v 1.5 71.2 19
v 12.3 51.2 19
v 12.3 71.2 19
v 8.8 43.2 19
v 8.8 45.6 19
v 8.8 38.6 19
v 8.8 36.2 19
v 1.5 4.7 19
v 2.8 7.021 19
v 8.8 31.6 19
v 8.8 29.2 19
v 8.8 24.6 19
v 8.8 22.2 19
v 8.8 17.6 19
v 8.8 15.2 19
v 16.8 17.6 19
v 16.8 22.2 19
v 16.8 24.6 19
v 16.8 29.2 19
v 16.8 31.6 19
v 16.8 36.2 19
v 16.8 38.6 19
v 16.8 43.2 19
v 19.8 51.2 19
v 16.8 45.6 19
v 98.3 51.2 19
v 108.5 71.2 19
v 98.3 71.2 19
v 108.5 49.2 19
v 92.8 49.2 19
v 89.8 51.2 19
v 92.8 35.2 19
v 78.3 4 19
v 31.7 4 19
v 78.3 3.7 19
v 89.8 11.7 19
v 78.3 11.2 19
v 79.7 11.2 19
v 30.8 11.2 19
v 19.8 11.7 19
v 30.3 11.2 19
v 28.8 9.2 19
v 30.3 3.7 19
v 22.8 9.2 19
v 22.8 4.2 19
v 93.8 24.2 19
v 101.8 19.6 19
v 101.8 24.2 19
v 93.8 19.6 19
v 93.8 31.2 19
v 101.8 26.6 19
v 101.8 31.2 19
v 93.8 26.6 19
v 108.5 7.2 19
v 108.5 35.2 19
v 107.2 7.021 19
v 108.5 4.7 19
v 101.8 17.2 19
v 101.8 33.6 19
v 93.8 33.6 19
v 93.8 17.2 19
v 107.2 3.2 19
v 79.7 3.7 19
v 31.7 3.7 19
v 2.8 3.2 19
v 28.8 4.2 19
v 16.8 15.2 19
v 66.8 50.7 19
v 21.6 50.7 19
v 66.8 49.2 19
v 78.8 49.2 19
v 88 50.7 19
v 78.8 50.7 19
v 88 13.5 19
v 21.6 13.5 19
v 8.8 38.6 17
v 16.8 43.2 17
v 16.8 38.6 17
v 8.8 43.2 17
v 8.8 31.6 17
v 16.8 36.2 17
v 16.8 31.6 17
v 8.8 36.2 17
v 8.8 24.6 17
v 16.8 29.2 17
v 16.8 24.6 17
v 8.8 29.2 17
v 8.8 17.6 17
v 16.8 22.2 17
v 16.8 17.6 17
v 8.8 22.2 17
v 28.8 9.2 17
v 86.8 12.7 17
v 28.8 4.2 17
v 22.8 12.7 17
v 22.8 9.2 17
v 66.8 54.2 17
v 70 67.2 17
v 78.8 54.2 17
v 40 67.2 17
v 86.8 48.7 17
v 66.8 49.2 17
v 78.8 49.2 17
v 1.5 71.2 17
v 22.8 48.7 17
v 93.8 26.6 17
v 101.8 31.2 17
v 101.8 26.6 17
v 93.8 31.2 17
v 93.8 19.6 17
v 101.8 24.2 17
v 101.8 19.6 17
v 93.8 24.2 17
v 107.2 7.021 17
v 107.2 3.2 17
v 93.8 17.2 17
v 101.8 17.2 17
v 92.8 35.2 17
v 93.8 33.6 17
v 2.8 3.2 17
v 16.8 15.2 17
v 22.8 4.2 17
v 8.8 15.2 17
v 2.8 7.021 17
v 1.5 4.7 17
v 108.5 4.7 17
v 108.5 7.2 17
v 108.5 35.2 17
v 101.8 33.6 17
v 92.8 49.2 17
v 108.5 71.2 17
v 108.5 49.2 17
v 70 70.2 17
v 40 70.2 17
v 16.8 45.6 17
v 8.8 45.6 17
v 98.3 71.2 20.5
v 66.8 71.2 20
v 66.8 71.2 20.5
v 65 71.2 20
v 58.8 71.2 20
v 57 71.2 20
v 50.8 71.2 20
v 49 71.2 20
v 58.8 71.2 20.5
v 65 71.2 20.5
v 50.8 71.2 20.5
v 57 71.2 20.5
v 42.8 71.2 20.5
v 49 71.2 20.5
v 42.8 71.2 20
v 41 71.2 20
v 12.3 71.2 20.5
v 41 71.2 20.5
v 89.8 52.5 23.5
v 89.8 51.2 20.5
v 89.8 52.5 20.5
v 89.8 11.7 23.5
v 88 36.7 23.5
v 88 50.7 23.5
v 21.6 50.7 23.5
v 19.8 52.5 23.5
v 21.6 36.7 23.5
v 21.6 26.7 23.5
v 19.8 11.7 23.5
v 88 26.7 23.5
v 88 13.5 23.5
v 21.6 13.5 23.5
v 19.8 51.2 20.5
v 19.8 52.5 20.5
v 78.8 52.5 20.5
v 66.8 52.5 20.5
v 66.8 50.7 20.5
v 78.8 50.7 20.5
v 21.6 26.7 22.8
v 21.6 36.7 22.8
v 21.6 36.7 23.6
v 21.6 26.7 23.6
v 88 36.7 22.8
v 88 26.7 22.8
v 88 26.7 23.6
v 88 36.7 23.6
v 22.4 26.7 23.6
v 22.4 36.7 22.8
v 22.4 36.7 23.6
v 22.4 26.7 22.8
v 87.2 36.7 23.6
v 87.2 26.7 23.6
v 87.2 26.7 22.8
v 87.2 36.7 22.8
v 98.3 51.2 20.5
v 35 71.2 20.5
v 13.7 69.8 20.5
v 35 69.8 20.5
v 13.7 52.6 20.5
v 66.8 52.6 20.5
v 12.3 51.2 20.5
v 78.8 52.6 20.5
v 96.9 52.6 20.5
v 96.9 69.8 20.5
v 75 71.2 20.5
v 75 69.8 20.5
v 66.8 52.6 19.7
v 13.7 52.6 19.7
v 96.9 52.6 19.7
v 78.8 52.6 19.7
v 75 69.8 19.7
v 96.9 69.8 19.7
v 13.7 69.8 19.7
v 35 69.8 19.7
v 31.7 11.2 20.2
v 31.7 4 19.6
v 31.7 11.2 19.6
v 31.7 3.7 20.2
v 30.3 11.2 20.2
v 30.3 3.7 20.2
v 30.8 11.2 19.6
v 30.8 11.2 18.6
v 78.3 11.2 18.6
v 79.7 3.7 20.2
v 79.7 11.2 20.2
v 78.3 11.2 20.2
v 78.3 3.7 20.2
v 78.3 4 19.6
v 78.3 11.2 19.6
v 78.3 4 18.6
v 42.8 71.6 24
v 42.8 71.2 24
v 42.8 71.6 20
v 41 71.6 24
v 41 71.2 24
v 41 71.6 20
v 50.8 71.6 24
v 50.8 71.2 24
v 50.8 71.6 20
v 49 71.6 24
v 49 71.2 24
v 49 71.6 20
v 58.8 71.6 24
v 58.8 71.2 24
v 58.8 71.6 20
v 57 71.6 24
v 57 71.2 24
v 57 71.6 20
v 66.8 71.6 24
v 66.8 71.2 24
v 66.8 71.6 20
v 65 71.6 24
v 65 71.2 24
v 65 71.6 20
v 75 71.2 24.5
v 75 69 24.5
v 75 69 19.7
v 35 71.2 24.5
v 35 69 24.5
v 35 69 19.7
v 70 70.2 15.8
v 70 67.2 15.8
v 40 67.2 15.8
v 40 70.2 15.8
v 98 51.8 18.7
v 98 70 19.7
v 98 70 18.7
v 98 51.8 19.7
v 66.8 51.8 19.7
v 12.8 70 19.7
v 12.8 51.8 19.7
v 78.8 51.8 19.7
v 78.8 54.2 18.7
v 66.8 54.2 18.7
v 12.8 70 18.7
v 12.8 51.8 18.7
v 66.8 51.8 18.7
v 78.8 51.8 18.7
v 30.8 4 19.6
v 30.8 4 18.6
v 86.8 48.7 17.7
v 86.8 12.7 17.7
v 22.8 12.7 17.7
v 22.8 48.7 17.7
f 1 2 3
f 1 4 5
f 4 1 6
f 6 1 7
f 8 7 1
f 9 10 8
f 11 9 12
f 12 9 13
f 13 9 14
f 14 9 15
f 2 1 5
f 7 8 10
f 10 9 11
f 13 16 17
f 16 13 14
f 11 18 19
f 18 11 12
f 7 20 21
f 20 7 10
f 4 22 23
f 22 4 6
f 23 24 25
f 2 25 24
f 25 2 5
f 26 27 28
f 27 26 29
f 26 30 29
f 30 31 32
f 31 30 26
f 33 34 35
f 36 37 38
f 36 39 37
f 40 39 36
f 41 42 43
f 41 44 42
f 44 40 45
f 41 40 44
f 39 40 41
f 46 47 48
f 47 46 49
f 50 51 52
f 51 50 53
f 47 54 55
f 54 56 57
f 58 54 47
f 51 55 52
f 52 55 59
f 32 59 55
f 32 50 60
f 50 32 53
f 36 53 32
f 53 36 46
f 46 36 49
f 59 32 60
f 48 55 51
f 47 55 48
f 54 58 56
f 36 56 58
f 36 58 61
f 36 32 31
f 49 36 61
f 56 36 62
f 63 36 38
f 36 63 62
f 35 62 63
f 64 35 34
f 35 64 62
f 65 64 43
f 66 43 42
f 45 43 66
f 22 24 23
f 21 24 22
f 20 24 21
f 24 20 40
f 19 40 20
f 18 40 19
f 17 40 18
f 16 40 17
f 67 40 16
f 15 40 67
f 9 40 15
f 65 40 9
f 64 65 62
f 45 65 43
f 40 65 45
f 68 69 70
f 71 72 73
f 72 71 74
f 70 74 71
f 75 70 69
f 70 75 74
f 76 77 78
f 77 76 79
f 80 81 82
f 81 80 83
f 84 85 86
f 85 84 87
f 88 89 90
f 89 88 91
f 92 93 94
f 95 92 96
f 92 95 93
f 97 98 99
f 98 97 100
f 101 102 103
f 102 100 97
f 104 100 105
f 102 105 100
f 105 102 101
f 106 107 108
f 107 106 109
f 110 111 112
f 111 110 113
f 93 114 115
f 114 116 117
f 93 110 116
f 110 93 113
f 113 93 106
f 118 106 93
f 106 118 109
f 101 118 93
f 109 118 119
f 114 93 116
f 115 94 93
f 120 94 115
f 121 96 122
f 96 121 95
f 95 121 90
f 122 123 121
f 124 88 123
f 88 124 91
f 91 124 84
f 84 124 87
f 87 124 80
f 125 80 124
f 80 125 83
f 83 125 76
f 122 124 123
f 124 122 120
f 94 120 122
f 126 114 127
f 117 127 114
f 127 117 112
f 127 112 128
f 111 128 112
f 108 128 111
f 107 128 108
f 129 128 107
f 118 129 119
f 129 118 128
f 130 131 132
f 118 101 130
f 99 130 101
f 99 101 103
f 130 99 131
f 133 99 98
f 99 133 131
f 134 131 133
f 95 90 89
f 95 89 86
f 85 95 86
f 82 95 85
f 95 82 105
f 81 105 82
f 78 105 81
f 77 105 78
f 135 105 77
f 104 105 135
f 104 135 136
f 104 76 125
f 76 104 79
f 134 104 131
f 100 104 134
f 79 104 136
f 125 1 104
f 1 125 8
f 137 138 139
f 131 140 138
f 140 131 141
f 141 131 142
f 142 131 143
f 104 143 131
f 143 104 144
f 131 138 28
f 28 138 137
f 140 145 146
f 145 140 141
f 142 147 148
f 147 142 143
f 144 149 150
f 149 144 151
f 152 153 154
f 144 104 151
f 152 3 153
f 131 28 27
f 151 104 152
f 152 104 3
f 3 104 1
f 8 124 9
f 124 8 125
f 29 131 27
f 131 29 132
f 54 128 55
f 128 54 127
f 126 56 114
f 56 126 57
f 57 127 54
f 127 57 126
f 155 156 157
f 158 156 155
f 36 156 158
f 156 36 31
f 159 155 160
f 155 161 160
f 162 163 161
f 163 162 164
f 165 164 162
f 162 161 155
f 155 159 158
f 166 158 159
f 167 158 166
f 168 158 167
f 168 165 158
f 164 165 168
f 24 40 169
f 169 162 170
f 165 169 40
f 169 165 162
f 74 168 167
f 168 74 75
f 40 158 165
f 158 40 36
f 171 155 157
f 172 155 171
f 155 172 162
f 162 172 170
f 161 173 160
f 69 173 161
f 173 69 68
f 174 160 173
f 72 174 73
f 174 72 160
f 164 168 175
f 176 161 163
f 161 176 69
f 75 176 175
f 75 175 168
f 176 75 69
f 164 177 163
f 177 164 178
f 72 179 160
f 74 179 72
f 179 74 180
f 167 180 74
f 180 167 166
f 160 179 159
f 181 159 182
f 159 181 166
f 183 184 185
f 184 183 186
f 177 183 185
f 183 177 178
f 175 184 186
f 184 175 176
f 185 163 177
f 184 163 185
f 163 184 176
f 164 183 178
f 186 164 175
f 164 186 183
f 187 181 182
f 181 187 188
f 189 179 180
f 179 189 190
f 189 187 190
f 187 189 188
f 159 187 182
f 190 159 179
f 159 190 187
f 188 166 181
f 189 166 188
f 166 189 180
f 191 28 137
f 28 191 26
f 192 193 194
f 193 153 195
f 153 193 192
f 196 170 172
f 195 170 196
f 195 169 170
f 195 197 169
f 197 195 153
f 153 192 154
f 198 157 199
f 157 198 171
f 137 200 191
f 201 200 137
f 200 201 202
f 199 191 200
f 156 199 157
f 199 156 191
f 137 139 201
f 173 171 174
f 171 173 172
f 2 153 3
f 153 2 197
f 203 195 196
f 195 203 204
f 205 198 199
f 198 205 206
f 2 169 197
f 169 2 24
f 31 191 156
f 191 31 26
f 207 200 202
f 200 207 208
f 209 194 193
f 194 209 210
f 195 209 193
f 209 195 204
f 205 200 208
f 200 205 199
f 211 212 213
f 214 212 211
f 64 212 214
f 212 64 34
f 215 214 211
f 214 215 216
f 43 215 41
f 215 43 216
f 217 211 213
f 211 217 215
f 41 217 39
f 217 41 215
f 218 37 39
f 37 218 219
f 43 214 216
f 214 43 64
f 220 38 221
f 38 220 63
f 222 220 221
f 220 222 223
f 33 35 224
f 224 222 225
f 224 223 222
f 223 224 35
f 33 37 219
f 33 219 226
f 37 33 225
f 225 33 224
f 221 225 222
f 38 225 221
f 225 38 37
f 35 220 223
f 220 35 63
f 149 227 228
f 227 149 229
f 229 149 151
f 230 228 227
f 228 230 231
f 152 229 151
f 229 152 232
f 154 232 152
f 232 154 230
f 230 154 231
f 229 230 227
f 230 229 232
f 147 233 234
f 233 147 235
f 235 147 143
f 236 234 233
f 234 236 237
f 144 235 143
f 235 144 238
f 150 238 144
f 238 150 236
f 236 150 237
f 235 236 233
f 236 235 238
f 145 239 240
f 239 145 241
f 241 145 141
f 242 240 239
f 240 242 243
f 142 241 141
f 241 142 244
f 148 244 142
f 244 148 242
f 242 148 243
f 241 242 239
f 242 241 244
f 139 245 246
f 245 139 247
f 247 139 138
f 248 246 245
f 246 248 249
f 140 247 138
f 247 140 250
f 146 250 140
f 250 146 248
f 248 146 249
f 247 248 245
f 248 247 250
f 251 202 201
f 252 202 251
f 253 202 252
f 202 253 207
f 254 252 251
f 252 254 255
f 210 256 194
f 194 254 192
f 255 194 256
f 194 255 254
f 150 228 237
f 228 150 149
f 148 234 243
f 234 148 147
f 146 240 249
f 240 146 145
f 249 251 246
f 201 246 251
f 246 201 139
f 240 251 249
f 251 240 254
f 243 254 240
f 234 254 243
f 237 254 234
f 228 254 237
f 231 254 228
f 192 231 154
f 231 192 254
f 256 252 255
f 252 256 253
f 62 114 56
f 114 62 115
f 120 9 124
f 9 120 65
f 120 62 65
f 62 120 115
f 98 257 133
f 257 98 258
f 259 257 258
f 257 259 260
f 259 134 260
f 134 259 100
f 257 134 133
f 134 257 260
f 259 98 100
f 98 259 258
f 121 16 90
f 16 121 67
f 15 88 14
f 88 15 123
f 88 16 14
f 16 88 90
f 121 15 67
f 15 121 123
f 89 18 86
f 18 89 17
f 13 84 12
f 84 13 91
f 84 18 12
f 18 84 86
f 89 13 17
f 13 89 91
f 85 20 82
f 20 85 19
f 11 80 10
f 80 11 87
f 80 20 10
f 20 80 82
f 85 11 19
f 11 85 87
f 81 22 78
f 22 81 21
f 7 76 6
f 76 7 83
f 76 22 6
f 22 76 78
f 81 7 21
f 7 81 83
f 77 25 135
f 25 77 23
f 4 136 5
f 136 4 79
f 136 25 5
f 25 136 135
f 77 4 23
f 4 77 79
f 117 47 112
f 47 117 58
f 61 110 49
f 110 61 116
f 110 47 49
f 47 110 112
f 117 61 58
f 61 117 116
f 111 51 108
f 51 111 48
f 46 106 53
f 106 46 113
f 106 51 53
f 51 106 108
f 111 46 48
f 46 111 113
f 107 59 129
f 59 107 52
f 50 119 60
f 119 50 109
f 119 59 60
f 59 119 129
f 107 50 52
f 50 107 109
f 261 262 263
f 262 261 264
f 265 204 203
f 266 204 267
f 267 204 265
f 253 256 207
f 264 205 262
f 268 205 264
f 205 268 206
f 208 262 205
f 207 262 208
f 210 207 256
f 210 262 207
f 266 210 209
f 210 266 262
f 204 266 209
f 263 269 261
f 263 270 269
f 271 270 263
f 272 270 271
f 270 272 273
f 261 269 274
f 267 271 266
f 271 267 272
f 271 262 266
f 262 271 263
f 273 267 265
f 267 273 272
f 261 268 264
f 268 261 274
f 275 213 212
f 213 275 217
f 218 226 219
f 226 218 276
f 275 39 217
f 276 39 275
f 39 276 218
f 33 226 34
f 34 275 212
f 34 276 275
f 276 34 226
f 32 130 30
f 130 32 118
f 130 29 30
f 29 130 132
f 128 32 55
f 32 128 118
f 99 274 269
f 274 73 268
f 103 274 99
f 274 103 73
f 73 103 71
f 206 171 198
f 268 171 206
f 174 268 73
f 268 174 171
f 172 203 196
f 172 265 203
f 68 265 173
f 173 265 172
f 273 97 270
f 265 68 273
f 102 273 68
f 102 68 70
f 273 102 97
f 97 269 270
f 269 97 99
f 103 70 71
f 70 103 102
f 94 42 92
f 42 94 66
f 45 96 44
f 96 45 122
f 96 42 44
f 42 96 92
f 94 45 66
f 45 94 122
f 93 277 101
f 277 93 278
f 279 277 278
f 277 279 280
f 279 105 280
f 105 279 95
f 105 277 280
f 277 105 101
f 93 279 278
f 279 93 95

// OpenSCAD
// =============================================================================
// OpenMotorBridge - Central Main Box: Slide-In Zwischenboden / Intermediate Tray (v10.0)
// =============================================================================
// File: hardware/cad/scad/01_main_box/parts/010_slide_tray.scad
// Description: Einschiebbarer Zwischenboden for the Central Box (Gehäuse Typ A)
//              utilizing the v10 Dual-Rail Monocoque Slide-In Principle:
//
// 1. Dual-Rail Track 1 Kinematics (Z = 18.0 mm):
//    - Lateral guide tongues sliding smoothly into the Rail 1 grooves of the tub.
//    - Chamfered front lead-in nose for effortless, self-aligning insertion.
//    - Separates the lower PCBA 01 compartment (Z = 0..17 mm) from the upper
//      battery & antenna chamber (Z = 18..38 mm) without requiring any screws!
//
// 2. Battery Accommodation:
//    - Dedicated cradle for 1S LiPo backup battery (2200 mAh flat cell: 67 x 38 x 5 mm).
//    - Lateral containment boundary ribs (h = 4.5 mm) preventing X/Y shifting.
//    - Underside damping recess for 1.0 mm vibration-absorbing EPDM foam.
//
// 3. Integrated RF Antenna Nests:
//    - Recessed adhesive nest for Taoglas FXP895 (LoRa 868 MHz flex PCB: 85 x 18 x 0.8 mm).
//    - Recessed adhesive nest for Taoglas FXP73 (2.4 GHz Wi-Fi/BLE: 47 x 7 x 0.5 mm).
//    - 100% metal-free, RF-transparent PA12 platform with maximum isolation.
//
// 4. Cable Management & Convective Airflow:
//    - J7 LiPo harness passthrough slot with C-clip strain relief.
//    - Dual U.FL coaxial cable drop channels to PCBA 01 RF ports (ANT1 & ANT2/3).
//    - Convective cooling breathing slots outside the battery footprint for PCBA 01
//      thermal dissipation towards the top lid Gore breather vent.
//
// 5. Ergonomic Rear Service Handle:
//    - Rear vertical pull/push ridge with tactile ribs for tool-free insertion & removal.
//    - Bottom registration detent locking against the tub lower rear sill.
// =============================================================================

include <../../00_common/parameters.scad>;

module main_box_slide_tray(
    tray_l   = 104.4, // Width along X inside tub chamber (mm)
    tray_w   = 68.0,  // Depth along Y from front wall to rear sill (mm)
    tray_t   = 2.0,   // Base floor thickness (mm)
    rail_z   = MAIN_BOX_RAIL1_Z // Nominal Rail 1 centerline height (18.0 mm)
) {
    tongue_prot = 1.3; // Lateral guide tongue protrusion into side groove (mm)
    tongue_h    = 2.0; // Guide tongue thickness in Z (mm)
    
    // Base coordinate origin:
    // Placed in assembly coordinates: X = 2.8, Y = 3.2, Z = rail_z - tray_t/2.0
    translate([2.8, 3.2, rail_z - tray_t/2.0]) {
        difference() {
            union() {
                // 1. Main Tray Structural Floor Plate
                cube([tray_l, tray_w, tray_t], center=false);

                // 2. Left Lateral Guide Tongue (slides into Left Rail 1 Groove)
                translate([-tongue_prot, 4.0, (tray_t - tongue_h)/2.0]) {
                    // Main tongue strip
                    cube([tongue_prot + 0.1, tray_w - 4.0, tongue_h], center=false);
                    // 45° Lead-in chamfer at front end
                    translate([0, -2.5, 0])
                        linear_extrude(height=tongue_h)
                            polygon(points=[[0, 0], [tongue_prot + 0.1, 2.5], [0, 2.5]]);
                }

                // 3. Right Lateral Guide Tongue (slides into Right Rail 1 Groove)
                translate([tray_l - 0.1, 4.0, (tray_t - tongue_h)/2.0]) {
                    // Main tongue strip
                    cube([tongue_prot + 0.1, tray_w - 4.0, tongue_h], center=false);
                    // 45° Lead-in chamfer at front end
                    translate([0, -2.5, 0])
                        linear_extrude(height=tongue_h)
                            polygon(points=[[tongue_prot + 0.1, 0], [0, 2.5], [tongue_prot + 0.1, 2.5]]);
                }

                // 4. Battery Containment Perimeter Ribs (for 67 x 38 x 5 mm LiPo in Center)
                // Battery placement: X = 17.0..87.0 mm (dx = 70 mm), Y = 8.5..47.5 mm (dy = 39 mm)
                // Rib height = 4.5 mm (Z = tray_t .. tray_t + 4.5)
                translate([17.0, 8.5, tray_t]) {
                    // Front containment rib (separating battery from South FXP73 antenna)
                    cube([70.0, 1.8, 4.5], center=false);
                    // Rear containment rib (separating battery from North FXP895 antenna)
                    translate([0, 39.0, 0])
                        cube([70.0, 1.8, 4.5], center=false);
                    // Left containment rib
                    cube([1.8, 40.8, 4.5], center=false);
                    // Right containment rib
                    translate([68.2, 0, 0])
                        cube([1.8, 40.8, 4.5], center=false);
                    // 2x Elastic retention catch nubs
                    translate([1.8, 15.0, 3.8])
                        cube([0.8, 10.0, 0.8], center=false);
                    translate([67.4, 15.0, 3.8])
                        cube([0.8, 10.0, 0.8], center=false);
                }

                // 5. Rear Antenna Bed Platform (Taoglas FXP895 LoRa 868 MHz: 85 x 18 mm at NORTH)
                // Elevated 0.6 mm above base plate for rigidity and cable routing clearance underneath
                translate([9.5, 48.0, tray_t]) {
                    // Border ribs around FXP895 antenna
                    cube([86.0, 1.4, 1.5], center=false);
                    translate([0, 18.6, 0])
                        cube([86.0, 1.4, 1.5], center=false);
                    cube([1.4, 20.0, 1.5], center=false);
                    translate([84.6, 0, 0])
                        cube([1.4, 20.0, 1.5], center=false);
                }

                // 5b. Front Antenna Bed Border (Taoglas FXP73 2.4 GHz: 47 x 7 mm at SOUTH)
                translate([27.5, 0.5, tray_t]) {
                    // Side borders for FXP73
                    cube([1.4, 7.5, 1.2], center=false);
                    translate([48.0, 0, 0])
                        cube([1.4, 7.5, 1.2], center=false);
                }

                // 6. Rear Service Handle Flange (at Y = tray_w - 2.5 mm, Z = tray_t .. tray_t + 5.5 mm)
                translate([tray_l/2.0 - 20.0, tray_w - 2.2, tray_t]) {
                    cube([40.0, 2.2, 5.5], center=false);
                    // Tactile grip ribs
                    for (gx = [6.0, 14.0, 22.0, 30.0]) {
                        translate([gx, 1.8, 1.0])
                            cube([1.8, 0.8, 4.0], center=false);
                    }
                }

                // 7. Underside Registration Detent (engages front of tub rear sill)
                translate([tray_l/2.0 - 15.0, tray_w - 4.0, -1.2]) {
                    cube([30.0, 3.0, 1.2], center=false);
                }
            }

            // --- SUBTRACTIONS ---

            // 8. Taoglas FXP895 Shallow Adhesive Nest (85.2 x 18.2 x 0.6 mm recess for LoRa 868 MHz at NORTH)
            // Located at North / Rear edge: X = 10.0..95.2 mm, Y = 48.6..66.8 mm
            translate([10.0, 48.6, tray_t - 0.3])
                cube([85.2, 18.2, 1.0], center=false);

            // 9. Taoglas FXP73 Shallow Adhesive Nest (47.5 x 7.2 x 0.5 mm recess for 2.4 GHz Wi-Fi/BLE at SOUTH)
            // Located at South / Front edge: X = 28.0..75.5 mm, Y = 0.8..8.0 mm
            translate([28.0, 0.8, tray_t - 0.4])
                cube([47.5, 7.2, 1.0], center=false);

            // 10. Cable Passthrough Openings
            // A. Battery J5 open lateral U-notch (allows tool-free tray sliding with pre-crimped Molex 4P plug)
            // Positioned directly over PCBA 01 J5 (X = 90.0 mm to right edge, Y = 32.0..46.0 mm)
            translate([90.0, 32.0, -0.5])
                cube([tray_l - 90.0 + 2.0, 14.0, tray_t + 2.0], center=false);

            // B. Shared Dual U.FL RF Coaxial Drop Slots:
            // - North LoRa U.FL slot down to PCBA 01 ANT1 (X = 64.0..76.0 mm, Y = 46.0..51.0 mm)
            translate([64.0, 46.0, -0.5])
                cube([12.0, 5.0, tray_t + 2.0], center=false);

            // - South 2.4 GHz U.FL slot down to PCBA 01 ESP32-S31 (X = 20.0..26.0 mm, Y = 1.0..6.0 mm)
            translate([20.0, 1.0, -0.5])
                cube([6.0, 5.0, tray_t + 2.0], center=false);

            // 11. Convective Thermal Breathing Louvers
            // Left flank breathing slots (X = 5.0..14.0 mm)
            for (sy = [12.0:7.0:44.0]) {
                translate([6.0, sy, -0.5])
                    cube([8.0, 2.4, tray_t + 2.0], center=false);
            }

            // Right flank breathing slots (X = 91.0..99.0 mm, directly over PCBA 01 L1 inductor & buck converter)
            for (sy = [14.0:7.0:30.0]) {
                translate([91.0, sy, -0.5])
                    cube([8.0, 2.4, tray_t + 2.0], center=false);
            }

            // 12. LiPo Underside Cushioning Foam Recess (64.0 x 36.0 x 0.8 mm)
            translate([20.0, 9.5, -0.1])
                cube([64.0, 36.0, 0.8], center=false);
        }
    }
}

// Standalone preview
main_box_slide_tray();
